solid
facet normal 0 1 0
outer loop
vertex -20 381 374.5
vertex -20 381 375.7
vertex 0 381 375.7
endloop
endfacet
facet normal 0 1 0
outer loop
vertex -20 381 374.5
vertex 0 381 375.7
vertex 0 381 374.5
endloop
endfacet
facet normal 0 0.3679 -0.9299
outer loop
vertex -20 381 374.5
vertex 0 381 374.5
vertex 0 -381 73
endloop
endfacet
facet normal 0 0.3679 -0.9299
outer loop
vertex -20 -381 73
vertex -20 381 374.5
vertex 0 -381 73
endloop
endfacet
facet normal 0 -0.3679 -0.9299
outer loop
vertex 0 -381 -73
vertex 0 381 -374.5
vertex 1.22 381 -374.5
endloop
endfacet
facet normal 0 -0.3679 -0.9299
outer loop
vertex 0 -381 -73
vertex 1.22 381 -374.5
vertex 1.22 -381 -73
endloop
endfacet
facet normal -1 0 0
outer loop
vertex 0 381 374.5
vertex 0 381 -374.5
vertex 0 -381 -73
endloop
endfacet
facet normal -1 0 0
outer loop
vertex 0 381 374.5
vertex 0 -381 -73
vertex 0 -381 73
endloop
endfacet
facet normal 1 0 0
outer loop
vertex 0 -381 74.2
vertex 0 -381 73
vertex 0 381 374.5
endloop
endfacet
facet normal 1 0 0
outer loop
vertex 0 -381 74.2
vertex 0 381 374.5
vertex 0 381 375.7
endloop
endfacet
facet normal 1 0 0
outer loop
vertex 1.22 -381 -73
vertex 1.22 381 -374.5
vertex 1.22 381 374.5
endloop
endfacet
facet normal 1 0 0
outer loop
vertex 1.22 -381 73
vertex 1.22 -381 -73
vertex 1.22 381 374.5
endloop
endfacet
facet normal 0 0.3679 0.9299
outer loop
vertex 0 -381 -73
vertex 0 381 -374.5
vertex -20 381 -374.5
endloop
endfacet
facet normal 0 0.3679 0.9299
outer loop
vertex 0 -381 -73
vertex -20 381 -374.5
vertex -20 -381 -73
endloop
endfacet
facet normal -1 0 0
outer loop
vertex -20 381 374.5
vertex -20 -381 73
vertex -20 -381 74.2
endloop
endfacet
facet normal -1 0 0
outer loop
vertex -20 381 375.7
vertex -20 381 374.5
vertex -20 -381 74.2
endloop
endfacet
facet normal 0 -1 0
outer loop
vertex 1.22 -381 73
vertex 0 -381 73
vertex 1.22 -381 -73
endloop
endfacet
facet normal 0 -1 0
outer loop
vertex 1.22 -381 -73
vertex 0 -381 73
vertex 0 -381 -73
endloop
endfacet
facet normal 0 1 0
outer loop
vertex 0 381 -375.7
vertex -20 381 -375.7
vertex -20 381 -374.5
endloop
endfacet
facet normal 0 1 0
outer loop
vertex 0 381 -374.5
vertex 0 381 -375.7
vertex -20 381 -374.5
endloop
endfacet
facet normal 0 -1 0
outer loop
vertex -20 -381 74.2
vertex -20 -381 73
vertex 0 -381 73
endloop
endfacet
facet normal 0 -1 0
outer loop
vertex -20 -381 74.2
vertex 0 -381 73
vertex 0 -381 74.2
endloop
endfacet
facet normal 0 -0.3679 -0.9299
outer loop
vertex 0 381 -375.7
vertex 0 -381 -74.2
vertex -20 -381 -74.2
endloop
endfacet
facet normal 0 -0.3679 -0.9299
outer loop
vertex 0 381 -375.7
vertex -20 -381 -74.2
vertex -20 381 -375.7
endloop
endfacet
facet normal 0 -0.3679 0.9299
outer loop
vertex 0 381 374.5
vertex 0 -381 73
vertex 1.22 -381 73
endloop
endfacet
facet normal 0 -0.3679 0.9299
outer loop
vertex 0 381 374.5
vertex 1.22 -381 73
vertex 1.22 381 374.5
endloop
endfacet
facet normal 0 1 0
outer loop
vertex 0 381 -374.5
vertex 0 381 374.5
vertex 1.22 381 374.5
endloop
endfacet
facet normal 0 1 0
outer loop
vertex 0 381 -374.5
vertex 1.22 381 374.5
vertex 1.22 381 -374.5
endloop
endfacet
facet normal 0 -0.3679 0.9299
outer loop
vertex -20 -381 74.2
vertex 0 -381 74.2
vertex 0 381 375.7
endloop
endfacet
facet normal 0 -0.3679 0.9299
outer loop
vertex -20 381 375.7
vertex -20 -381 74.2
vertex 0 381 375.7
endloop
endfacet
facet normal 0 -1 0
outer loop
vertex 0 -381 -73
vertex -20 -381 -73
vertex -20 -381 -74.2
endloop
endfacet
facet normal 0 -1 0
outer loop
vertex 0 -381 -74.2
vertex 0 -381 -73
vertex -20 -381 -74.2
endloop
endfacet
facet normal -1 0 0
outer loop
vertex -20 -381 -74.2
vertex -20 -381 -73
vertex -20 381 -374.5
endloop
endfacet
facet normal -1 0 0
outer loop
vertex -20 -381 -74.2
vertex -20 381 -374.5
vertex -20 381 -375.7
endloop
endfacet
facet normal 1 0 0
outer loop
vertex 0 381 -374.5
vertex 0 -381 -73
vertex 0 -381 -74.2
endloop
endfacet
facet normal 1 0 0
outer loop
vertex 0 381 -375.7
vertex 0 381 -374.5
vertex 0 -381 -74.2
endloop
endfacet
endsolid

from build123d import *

# Parameters (mm, degrees)
BOSS_EXTRUDE1_DEPTH   = 1.22
BOSS_EXTRUDE2_DEPTH   = 20
BOSS_EXTRUDE2_2_DEPTH = 20


with BuildPart() as part:
    # Sketch1 → Boss-Extrude1 (new body)
    with BuildSketch(Plane(origin=(0, 0, 0), x_dir=(0, 0, -1), z_dir=(1, 0, 0))):
        Polygon((-374.5, 381), (374.5, 381), (73, -381), (0, -381), (-73, -381), align=None)
    extrude(amount=BOSS_EXTRUDE1_DEPTH)


with BuildPart() as body_2:
    # Sketch3 → Boss-Extrude2 (new body)
    with BuildSketch(Plane.ZY):
        Polygon((73, -381), (74.2, -381), (375.7, 381), (374.5, 381), align=None)
    extrude(amount=BOSS_EXTRUDE2_DEPTH)


with BuildPart() as body_3:
    # Sketch3 → Boss-Extrude2 2 (new body)
    with BuildSketch(Plane.ZY):
        Polygon((-73, -381), (-74.2, -381), (-375.7, 381), (-374.5, 381), align=None)
    extrude(amount=BOSS_EXTRUDE2_2_DEPTH)


solid = Compound([part.part, body_2.part, body_3.part])
